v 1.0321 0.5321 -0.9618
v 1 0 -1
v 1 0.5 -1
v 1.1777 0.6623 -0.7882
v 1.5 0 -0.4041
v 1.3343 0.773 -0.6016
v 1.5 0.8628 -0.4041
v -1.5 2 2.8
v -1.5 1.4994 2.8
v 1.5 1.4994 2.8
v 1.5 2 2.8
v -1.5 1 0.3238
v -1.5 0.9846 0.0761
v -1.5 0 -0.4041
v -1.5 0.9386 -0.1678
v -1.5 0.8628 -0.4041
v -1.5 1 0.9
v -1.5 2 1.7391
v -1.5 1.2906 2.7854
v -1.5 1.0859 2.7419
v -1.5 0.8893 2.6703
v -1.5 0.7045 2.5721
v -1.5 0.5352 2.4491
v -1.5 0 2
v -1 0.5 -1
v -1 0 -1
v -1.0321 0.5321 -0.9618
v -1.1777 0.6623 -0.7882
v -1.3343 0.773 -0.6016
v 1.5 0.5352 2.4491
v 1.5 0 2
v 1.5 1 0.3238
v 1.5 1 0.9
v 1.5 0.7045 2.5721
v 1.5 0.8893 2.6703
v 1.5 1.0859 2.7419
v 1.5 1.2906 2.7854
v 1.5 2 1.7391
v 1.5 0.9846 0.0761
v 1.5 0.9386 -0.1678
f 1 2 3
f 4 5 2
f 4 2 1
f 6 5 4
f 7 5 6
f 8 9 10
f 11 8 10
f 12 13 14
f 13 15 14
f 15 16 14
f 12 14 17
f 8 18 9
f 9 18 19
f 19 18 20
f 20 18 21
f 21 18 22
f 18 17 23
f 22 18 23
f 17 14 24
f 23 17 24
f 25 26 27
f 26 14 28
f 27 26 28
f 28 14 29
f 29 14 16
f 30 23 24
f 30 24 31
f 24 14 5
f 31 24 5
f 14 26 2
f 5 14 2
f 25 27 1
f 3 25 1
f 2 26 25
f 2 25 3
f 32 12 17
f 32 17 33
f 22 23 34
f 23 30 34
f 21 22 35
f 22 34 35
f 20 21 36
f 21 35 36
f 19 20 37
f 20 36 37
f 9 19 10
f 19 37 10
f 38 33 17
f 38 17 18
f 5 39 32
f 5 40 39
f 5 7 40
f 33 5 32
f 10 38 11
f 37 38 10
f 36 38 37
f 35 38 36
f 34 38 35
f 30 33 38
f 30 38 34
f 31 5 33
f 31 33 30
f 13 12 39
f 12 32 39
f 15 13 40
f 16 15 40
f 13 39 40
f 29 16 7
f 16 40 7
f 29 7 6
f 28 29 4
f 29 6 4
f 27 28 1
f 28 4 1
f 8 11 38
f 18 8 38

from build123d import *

# Parameters (mm, degrees)
SKETCH_1_W       = 3
SKETCH_1_H       = 3.8
EXTRUDE_1_DEPTH  = 1
SKETCH_2_W       = 3
SKETCH_2_H       = 1
EXTRUDE_2_DEPTH  = 1
CHAMFER_1_SIZE   = 0.5
CHAMFER_1_SIZE2  = 0.595876796
FILLET_1_R       = 2
CHAMFER_4_SIZE   = 0.8
CHAMFER_4_SIZE2  = 0.953402874
CHAMFER_3_SIZE   = 0.9
CHAMFER_3_SIZE_2 = 1.072578233
FILLET_2_R       = 1.5


with BuildPart() as part:
    # 草图1 → 凸台-拉伸1 (new body)
    with BuildSketch(Plane(origin=(0, 0, 0), x_dir=(1, 0, 0), z_dir=(0, 1, 0))):
        with Locations((0, -0.9)):
            Rectangle(SKETCH_1_W, SKETCH_1_H)
    extrude(amount=EXTRUDE_1_DEPTH)

    # 草图2 → 凸台-拉伸2 (add)
    with BuildSketch(Plane(origin=(0, 1, 0), x_dir=(1, 0, 0), z_dir=(0, 1, 0))):
        with Locations((0, -2.3)):
            Rectangle(SKETCH_2_W, SKETCH_2_H)
    extrude(amount=EXTRUDE_2_DEPTH)

    # 倒角1
    chamfer_1_edges = [part.edges().sort_by_distance(p)[0] for p in [
        (0, 1, -1),
        (-1.5, 0.5, -1),
        (1.5, 0.5, -1),
    ]]
    chamfer_1_side = [part.faces().sort_by_distance(p)[0] for p in [
        (0, 0.5, -1),
    ]]
    chamfer(chamfer_1_edges, length=CHAMFER_1_SIZE, length2=CHAMFER_1_SIZE2, reference=chamfer_1_side[0])

    # 圆角1
    fillet_1_edges = [part.edges().sort_by_distance(p)[0] for p in [
        (0, 1, -0.404123204),
    ]]
    fillet(fillet_1_edges, radius=FILLET_1_R)

    # 倒角4
    chamfer_4_edges = [part.edges().sort_by_distance(p)[0] for p in [
        (0, 0, 2.8),
    ]]
    chamfer_4_side = [part.faces().sort_by_distance(p)[0] for p in [
        (0, 0, 0.945658616),
    ]]
    chamfer(chamfer_4_edges, length=CHAMFER_4_SIZE, length2=CHAMFER_4_SIZE2, reference=chamfer_4_side[0])

    # 倒角3
    # the kernel refuses this chamfer: 1.072578233, 0.9 mm, written as the material it adds along each edge
    with BuildSketch(Plane(origin=(1.5, 1, 1.8), x_dir=(0, -0.03540953691366302, -0.9993728857116146), z_dir=(-1, 0, 0))) as chamfer_3_piece_1_section:
        Polygon((CHAMFER_3_SIZE * 0.999372885712, -CHAMFER_3_SIZE * 0.0354095369137), (-CHAMFER_3_SIZE_2 * 0.0354095369247, -CHAMFER_3_SIZE_2 * 0.999372886024), (0, 0), align=None)
    chamfer_3_piece_1 = extrude(amount=3, mode=Mode.PRIVATE)
    chamfer_3_piece_1 = split(chamfer_3_piece_1, bisect_by=Plane(origin=(0, 2, 1.501522224), z_dir=(0, -1, 0)), keep=Keep.TOP, mode=Mode.PRIVATE)
    add(chamfer_3_piece_1)

    # 圆角2
    fillet_2_edges = [part.edges().sort_by_distance(p)[0] for p in [
        (0, 0.953402874, 2.8),
    ]]
    fillet(fillet_2_edges, radius=FILLET_2_R)


solid = part.part
